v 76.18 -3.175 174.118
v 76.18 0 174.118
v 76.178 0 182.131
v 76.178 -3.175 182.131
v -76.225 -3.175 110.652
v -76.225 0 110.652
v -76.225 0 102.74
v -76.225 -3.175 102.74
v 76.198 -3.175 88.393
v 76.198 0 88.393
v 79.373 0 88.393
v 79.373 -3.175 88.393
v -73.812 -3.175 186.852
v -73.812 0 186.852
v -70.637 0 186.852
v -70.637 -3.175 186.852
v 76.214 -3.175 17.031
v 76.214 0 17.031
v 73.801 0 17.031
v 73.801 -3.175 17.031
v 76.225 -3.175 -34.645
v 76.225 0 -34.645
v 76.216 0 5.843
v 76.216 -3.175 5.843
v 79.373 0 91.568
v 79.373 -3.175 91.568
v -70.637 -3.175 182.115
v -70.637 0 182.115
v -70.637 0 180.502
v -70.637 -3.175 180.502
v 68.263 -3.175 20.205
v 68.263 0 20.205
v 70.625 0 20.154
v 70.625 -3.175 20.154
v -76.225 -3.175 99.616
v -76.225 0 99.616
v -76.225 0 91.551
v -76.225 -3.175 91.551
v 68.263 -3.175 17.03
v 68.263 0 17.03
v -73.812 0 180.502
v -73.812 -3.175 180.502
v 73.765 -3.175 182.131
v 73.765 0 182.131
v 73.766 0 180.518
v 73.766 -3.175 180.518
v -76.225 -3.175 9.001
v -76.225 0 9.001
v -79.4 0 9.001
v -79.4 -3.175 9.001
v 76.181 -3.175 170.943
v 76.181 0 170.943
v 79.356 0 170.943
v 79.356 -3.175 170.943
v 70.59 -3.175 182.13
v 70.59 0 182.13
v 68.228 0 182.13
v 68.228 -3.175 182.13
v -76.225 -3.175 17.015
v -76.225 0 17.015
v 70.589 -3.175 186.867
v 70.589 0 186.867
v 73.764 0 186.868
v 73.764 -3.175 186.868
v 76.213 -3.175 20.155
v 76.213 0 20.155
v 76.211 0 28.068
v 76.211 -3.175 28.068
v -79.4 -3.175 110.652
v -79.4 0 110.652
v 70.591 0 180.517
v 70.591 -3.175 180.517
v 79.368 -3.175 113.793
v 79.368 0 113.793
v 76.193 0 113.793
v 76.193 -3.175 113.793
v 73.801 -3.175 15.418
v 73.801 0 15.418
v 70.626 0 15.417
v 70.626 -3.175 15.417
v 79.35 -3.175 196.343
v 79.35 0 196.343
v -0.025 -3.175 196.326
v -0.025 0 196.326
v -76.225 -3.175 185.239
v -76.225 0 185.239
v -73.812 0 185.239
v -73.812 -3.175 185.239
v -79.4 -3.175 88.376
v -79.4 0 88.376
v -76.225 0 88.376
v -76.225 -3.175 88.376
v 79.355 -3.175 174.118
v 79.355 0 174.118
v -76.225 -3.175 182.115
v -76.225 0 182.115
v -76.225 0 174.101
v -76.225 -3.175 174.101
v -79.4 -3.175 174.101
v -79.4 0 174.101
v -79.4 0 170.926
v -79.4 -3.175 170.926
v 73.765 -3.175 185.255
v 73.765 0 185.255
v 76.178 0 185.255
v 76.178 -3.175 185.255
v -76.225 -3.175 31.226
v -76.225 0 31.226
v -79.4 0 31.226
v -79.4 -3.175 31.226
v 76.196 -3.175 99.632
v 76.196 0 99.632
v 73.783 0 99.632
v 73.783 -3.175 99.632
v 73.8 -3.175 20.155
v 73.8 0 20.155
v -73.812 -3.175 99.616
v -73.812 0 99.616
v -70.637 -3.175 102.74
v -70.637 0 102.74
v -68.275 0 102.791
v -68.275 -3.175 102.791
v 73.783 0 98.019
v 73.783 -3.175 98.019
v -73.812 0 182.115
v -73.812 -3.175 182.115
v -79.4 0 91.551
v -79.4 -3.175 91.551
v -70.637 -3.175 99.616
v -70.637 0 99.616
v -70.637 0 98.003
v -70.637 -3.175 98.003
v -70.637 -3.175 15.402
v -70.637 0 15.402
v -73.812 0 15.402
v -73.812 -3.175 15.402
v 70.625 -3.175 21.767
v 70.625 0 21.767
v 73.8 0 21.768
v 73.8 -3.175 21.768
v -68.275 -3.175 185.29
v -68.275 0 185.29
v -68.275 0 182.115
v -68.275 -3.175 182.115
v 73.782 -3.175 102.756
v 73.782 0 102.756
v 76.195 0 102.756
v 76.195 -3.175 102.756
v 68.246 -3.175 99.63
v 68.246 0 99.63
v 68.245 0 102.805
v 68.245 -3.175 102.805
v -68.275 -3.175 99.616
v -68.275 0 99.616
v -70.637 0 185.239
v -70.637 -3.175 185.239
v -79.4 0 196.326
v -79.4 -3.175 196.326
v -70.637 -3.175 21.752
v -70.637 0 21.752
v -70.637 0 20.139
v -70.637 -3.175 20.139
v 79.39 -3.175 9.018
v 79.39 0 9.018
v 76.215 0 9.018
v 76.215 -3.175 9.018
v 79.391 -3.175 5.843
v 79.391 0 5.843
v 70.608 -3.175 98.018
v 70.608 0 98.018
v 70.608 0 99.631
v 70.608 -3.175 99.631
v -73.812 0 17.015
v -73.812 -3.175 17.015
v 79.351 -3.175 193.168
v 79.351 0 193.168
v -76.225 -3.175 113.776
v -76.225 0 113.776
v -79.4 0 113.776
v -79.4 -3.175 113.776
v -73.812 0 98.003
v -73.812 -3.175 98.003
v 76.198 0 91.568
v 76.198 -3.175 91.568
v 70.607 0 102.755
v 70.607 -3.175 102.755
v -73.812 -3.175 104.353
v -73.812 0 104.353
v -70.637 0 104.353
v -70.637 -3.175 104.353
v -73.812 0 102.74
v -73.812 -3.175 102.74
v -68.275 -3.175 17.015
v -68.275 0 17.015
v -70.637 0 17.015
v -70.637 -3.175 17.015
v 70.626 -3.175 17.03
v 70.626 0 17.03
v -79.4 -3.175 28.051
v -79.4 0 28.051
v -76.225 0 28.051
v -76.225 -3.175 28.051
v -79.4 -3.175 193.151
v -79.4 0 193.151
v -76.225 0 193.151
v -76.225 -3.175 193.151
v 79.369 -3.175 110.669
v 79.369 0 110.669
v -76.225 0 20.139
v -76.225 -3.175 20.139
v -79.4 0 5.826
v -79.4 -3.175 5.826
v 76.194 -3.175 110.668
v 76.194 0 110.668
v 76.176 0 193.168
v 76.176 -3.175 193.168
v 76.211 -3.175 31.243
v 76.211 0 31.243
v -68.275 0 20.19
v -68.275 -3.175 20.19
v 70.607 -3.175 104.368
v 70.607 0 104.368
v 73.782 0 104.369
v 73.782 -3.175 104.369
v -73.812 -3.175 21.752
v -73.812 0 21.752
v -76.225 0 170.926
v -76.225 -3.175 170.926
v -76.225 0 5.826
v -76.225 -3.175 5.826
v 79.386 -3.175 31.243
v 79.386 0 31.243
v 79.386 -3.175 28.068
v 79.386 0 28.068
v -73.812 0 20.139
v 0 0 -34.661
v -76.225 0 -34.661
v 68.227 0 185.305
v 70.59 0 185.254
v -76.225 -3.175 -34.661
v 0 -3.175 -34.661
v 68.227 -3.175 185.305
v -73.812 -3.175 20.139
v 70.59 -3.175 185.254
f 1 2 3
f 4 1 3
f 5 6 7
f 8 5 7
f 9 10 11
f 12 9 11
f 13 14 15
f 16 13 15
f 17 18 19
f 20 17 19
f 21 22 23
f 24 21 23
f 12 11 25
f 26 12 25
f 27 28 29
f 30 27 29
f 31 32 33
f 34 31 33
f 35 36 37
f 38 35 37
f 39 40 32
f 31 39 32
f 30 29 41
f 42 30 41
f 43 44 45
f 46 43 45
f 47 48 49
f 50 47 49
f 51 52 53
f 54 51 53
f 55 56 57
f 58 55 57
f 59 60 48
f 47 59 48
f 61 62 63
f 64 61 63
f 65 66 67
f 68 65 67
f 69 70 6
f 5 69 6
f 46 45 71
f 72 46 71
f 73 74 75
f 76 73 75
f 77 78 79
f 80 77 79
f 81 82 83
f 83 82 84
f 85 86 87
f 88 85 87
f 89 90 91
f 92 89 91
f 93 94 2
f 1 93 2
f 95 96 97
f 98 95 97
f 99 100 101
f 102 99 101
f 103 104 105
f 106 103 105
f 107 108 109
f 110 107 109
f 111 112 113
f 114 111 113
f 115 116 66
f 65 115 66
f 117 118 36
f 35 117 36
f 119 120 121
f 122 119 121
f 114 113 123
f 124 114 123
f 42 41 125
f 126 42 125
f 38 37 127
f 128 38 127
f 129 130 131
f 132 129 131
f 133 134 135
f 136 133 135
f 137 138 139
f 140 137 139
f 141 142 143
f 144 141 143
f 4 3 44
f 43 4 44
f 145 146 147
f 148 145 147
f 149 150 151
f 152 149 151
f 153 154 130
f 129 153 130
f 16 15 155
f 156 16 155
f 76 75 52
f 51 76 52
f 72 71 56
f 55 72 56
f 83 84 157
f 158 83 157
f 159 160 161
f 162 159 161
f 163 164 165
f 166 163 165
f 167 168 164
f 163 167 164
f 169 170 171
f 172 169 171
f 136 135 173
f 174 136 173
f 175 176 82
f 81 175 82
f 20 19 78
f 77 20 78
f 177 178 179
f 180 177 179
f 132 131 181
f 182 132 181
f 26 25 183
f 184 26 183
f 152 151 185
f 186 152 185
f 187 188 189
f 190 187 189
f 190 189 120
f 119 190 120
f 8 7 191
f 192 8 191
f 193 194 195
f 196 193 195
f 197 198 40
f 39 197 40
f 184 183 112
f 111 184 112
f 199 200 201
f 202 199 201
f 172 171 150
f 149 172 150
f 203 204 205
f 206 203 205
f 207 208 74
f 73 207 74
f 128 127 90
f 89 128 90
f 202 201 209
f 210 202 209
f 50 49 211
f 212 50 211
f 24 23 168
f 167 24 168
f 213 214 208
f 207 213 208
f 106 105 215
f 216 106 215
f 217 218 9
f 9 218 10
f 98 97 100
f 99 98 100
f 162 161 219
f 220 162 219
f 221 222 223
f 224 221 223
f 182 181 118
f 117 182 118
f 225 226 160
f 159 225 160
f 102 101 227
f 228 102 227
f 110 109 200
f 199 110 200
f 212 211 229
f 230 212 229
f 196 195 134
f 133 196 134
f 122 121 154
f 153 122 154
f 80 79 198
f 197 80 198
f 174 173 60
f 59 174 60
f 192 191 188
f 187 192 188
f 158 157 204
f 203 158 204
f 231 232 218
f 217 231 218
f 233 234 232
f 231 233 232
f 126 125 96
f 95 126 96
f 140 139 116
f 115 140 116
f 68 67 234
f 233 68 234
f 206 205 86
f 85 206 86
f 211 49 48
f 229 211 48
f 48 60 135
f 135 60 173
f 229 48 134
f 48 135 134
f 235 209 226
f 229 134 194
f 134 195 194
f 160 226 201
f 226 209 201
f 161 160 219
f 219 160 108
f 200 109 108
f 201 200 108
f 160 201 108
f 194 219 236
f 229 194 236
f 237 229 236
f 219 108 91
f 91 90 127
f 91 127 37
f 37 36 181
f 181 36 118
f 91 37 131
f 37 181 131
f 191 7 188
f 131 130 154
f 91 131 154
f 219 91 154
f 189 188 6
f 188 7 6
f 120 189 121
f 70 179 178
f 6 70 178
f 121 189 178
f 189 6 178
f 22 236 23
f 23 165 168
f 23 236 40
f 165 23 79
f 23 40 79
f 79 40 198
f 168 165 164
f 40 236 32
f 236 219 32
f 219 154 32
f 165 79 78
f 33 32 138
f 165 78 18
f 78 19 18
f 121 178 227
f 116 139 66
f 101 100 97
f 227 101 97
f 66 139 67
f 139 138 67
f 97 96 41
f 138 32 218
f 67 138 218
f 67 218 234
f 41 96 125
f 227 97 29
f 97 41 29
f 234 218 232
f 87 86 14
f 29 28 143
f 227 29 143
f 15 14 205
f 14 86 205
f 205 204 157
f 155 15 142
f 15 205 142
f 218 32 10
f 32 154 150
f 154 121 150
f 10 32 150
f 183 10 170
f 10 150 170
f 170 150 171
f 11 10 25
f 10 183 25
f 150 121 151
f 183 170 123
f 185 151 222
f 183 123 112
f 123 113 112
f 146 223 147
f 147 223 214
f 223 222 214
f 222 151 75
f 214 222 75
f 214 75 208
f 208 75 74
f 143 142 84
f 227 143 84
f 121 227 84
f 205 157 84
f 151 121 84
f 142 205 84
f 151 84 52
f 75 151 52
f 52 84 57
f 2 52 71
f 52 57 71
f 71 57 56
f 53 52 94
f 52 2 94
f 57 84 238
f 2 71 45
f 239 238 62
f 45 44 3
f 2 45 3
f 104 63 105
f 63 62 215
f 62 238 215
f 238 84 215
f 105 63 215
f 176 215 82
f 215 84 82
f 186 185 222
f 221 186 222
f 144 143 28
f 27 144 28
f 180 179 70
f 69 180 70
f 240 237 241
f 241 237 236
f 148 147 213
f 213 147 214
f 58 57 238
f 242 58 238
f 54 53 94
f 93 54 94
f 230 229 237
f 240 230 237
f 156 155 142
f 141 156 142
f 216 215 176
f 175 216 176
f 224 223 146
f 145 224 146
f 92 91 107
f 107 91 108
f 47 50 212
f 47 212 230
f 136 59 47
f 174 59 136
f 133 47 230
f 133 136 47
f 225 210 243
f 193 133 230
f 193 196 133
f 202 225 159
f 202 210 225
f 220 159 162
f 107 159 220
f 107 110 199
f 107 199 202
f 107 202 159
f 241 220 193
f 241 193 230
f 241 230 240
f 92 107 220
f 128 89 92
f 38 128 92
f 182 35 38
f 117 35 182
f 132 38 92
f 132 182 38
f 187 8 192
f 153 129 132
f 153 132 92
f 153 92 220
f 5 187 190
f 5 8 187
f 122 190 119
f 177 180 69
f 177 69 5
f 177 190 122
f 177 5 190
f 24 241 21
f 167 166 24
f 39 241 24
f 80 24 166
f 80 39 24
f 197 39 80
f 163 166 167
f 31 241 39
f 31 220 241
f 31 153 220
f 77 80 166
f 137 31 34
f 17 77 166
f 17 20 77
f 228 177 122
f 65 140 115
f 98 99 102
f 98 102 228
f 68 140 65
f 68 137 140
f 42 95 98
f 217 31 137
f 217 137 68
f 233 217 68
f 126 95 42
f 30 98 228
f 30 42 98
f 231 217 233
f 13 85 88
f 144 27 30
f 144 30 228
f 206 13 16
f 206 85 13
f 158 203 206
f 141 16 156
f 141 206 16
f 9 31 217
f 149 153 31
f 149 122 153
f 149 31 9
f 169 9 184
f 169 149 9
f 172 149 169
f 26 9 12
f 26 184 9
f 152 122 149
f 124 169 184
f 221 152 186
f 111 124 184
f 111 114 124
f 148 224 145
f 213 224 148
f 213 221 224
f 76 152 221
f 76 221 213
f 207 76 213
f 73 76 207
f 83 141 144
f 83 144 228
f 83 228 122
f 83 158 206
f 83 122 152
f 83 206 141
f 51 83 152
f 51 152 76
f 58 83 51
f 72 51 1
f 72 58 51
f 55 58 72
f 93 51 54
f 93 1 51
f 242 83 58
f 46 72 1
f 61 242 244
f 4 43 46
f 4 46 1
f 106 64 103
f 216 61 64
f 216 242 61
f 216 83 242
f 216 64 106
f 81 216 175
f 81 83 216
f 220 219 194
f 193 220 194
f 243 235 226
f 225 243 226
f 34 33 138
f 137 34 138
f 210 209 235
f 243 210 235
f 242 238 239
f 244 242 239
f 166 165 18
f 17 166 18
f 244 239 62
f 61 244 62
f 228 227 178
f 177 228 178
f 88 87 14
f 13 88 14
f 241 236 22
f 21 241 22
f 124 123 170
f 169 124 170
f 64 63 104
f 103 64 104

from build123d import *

# Parameters (mm, degrees)
F1_DEPTH = 3.175


# Not quite as in the source:
# - ends of sketch curves that miss each other by under 0.0002 mm in the source are joined


with BuildPart() as f1:
    # F0 (on Front) → F1 (new body)
    with BuildSketch(Plane.XZ):
        Polygon((-0.0247448797, 196.3262024198), (-79.3997448797, 196.3262024198), (-79.3997448797, 193.1512024198), (-76.2247448797, 193.1512024198), (-76.2247448797, 185.2391024198), (-73.8117448797, 185.2391024198), (-73.8117448797, 186.8520024198), (-70.6367448797, 186.8520024198), (-70.6367448797, 185.2391024198), (-68.2745449228, 185.2899024198), (-68.2745449228, 182.1149024198), (-70.6367449228, 182.1149024198), (-70.6367449228, 180.5020024198), (-73.8117449228, 180.5020024198), (-73.8117449228, 182.1149024198), (-76.2247448797, 182.1149024198), (-76.2247448797, 174.1012024198), (-79.3997448797, 174.1012024198), (-79.3997448797, 170.9262024198), (-76.2247448797, 170.9262024198), (-76.2247448797, 113.7762024198), (-79.3997448797, 113.7762024198), (-79.3997421861, 110.6520024198), (-76.2247421861, 110.6520024198), (-76.2247421861, 102.7399024198), (-73.8117421861, 102.7399024198), (-73.8117421861, 104.3528024198), (-70.6367421861, 104.3528024198), (-70.6367421861, 102.7399024198), (-68.2745421861, 102.7907024198), (-68.2745421861, 99.6157024198), (-70.6367421861, 99.6157024198), (-70.6367421861, 98.0028024198), (-73.8117421861, 98.0028024198), (-73.8117421861, 99.6157024198), (-76.2247421861, 99.6157024198), (-76.2247421861, 91.5512024198), (-79.3997421861, 91.5512024198), (-79.3997421861, 88.3762024198), (-76.2247449228, 88.3762024198), (-76.2247449228, 31.2262024198), (-79.3997448797, 31.2262024198), (-79.3997421861, 28.0512024198), (-76.2247421861, 28.0512024198), (-76.2247421861, 20.1391024198), (-73.8117421861, 20.1391024198), (-73.8117421861, 21.7520024198), (-70.6367421861, 21.7520024198), (-70.6367421861, 20.1391024198), (-68.2745421861, 20.1899024198), (-68.2745421861, 17.0149024198), (-70.6367421861, 17.0149024198), (-70.6367421861, 15.4020024198), (-73.8117421861, 15.4020024198), (-73.8117421861, 17.0149024198), (-76.2247421861, 17.0149024198), (-76.2247421861, 9.0012024198), (-79.3997421861, 9.0012024198), (-79.3997421861, 5.8262024198), (-76.2247421861, 5.8262024198), (-76.2247421861, -34.6613975802), (0, -34.6613975802), align=None)
        Polygon((79.3502532985, 196.3432087423), (-0.0247448797, 196.3262024198), (0, -34.6613975802), (76.2247404365, -34.6450662095), (76.2160658516, 5.8425328612), (79.3910657787, 5.8432131141), (79.3903855258, 9.0182130412), (76.2153855987, 9.0175327883), (76.2136686404, 17.0312326044), (73.8006686958, 17.0307156122), (73.8010142642, 15.4178156492), (70.6260143371, 15.4171353963), (70.6256687686, 17.0300353593), (68.2634688228, 17.0295292511), (68.2627885699, 20.2045291783), (70.6249993998, 20.1542352876), (70.6246538313, 21.7671352506), (73.7996537584, 21.7678155035), (73.7999993269, 20.1549155405), (76.2129992715, 20.1554325327), (76.2113040813, 28.0675323511), (79.3863040084, 28.068212604), (79.3856264492, 31.2432125317), (76.2106265651, 31.2425322788), (76.198382013, 88.3925309671), (79.3733792034, 88.3932112194), (79.3726989505, 91.5682111465), (76.1976990233, 91.5675308936), (76.195971181, 99.6320307085), (73.7829712364, 99.6315137163), (73.7833168048, 98.0186137533), (70.6083168777, 98.0179335004), (70.6079713092, 99.6308334634), (68.2457713634, 99.6303273553), (68.2450911105, 102.8053272824), (70.6073019404, 102.7550333917), (70.6069563719, 104.3679333547), (73.781956299, 104.3686136076), (73.7823018675, 102.7557136446), (76.1953018121, 102.7562306368), (76.1936066219, 110.6683304552), (79.368606549, 110.6690107081), (79.3679371802, 113.7932106364), (76.1929399467, 113.7925303841), (76.1806953945, 170.9425290724), (79.3556953216, 170.9432093253), (79.3550150687, 174.1182092524), (76.1800151416, 174.1175289995), (76.1782981833, 182.1312288156), (73.7652982818, 182.1307118234), (73.7656438503, 180.5178118604), (70.5906439231, 180.5171316075), (70.5902983547, 182.1300315705), (68.2280984089, 182.1295254623), (68.227418156, 185.3045253894), (70.5896289427, 185.2542314987), (70.5892833742, 186.8671314617), (73.7642833014, 186.8678117146), (73.7646288698, 185.2549117516), (76.1776288145, 185.2554287439), (76.1759336242, 193.1675285623), (79.3509335514, 193.1682088151), align=None)
    extrude(amount=F1_DEPTH)


solid = f1.part
